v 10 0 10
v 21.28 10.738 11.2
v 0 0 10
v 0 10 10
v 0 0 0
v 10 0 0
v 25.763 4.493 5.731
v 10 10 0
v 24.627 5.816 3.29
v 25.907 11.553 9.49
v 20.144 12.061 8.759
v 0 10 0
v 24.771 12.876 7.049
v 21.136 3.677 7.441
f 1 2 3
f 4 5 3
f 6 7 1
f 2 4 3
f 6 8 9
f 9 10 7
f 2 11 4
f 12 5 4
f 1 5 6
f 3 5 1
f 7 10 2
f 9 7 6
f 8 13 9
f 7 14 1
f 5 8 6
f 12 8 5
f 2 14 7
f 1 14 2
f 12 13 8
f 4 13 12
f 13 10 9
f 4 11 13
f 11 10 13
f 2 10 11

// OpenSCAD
hull() { cube(10); translate([20, 5, 5]) rotate([30, 20, 10]) cube([5, 8, 3]); }
